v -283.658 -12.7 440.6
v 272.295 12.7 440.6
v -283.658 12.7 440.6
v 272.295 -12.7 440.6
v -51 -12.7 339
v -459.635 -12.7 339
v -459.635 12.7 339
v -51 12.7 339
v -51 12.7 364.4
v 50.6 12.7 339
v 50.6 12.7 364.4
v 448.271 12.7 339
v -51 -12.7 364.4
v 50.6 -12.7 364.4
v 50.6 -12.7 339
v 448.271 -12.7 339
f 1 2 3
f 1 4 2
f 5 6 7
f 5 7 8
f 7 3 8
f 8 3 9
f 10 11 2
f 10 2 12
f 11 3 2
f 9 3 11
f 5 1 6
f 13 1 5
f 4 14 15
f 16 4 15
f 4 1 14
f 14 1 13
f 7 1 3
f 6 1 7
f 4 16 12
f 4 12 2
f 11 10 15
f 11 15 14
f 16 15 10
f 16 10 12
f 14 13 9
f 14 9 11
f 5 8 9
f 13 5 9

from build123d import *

# Parameters (mm, degrees)
F2_DEPTH = 12.7
F3_W     = 101.6
F3_H     = 25.4
F4_DEPTH = 50


with BuildPart() as f2:
    # F1 (on Front) → F2 (new body, symmetric)
    with BuildSketch(Plane.XZ):
        Polygon((-283.658414, 440.6), (-459.634776, 339), (448.271281, 339), (272.294919, 440.6), align=None)
    extrude(amount=F2_DEPTH, both=True)

    # F3 (on Front) → F4 (cut, symmetric)
    with BuildSketch(Plane.XZ):
        with Locations((-0.2, 351.7)):
            Rectangle(F3_W, F3_H)
    extrude(amount=F4_DEPTH, both=True, mode=Mode.SUBTRACT)


solid = f2.part
